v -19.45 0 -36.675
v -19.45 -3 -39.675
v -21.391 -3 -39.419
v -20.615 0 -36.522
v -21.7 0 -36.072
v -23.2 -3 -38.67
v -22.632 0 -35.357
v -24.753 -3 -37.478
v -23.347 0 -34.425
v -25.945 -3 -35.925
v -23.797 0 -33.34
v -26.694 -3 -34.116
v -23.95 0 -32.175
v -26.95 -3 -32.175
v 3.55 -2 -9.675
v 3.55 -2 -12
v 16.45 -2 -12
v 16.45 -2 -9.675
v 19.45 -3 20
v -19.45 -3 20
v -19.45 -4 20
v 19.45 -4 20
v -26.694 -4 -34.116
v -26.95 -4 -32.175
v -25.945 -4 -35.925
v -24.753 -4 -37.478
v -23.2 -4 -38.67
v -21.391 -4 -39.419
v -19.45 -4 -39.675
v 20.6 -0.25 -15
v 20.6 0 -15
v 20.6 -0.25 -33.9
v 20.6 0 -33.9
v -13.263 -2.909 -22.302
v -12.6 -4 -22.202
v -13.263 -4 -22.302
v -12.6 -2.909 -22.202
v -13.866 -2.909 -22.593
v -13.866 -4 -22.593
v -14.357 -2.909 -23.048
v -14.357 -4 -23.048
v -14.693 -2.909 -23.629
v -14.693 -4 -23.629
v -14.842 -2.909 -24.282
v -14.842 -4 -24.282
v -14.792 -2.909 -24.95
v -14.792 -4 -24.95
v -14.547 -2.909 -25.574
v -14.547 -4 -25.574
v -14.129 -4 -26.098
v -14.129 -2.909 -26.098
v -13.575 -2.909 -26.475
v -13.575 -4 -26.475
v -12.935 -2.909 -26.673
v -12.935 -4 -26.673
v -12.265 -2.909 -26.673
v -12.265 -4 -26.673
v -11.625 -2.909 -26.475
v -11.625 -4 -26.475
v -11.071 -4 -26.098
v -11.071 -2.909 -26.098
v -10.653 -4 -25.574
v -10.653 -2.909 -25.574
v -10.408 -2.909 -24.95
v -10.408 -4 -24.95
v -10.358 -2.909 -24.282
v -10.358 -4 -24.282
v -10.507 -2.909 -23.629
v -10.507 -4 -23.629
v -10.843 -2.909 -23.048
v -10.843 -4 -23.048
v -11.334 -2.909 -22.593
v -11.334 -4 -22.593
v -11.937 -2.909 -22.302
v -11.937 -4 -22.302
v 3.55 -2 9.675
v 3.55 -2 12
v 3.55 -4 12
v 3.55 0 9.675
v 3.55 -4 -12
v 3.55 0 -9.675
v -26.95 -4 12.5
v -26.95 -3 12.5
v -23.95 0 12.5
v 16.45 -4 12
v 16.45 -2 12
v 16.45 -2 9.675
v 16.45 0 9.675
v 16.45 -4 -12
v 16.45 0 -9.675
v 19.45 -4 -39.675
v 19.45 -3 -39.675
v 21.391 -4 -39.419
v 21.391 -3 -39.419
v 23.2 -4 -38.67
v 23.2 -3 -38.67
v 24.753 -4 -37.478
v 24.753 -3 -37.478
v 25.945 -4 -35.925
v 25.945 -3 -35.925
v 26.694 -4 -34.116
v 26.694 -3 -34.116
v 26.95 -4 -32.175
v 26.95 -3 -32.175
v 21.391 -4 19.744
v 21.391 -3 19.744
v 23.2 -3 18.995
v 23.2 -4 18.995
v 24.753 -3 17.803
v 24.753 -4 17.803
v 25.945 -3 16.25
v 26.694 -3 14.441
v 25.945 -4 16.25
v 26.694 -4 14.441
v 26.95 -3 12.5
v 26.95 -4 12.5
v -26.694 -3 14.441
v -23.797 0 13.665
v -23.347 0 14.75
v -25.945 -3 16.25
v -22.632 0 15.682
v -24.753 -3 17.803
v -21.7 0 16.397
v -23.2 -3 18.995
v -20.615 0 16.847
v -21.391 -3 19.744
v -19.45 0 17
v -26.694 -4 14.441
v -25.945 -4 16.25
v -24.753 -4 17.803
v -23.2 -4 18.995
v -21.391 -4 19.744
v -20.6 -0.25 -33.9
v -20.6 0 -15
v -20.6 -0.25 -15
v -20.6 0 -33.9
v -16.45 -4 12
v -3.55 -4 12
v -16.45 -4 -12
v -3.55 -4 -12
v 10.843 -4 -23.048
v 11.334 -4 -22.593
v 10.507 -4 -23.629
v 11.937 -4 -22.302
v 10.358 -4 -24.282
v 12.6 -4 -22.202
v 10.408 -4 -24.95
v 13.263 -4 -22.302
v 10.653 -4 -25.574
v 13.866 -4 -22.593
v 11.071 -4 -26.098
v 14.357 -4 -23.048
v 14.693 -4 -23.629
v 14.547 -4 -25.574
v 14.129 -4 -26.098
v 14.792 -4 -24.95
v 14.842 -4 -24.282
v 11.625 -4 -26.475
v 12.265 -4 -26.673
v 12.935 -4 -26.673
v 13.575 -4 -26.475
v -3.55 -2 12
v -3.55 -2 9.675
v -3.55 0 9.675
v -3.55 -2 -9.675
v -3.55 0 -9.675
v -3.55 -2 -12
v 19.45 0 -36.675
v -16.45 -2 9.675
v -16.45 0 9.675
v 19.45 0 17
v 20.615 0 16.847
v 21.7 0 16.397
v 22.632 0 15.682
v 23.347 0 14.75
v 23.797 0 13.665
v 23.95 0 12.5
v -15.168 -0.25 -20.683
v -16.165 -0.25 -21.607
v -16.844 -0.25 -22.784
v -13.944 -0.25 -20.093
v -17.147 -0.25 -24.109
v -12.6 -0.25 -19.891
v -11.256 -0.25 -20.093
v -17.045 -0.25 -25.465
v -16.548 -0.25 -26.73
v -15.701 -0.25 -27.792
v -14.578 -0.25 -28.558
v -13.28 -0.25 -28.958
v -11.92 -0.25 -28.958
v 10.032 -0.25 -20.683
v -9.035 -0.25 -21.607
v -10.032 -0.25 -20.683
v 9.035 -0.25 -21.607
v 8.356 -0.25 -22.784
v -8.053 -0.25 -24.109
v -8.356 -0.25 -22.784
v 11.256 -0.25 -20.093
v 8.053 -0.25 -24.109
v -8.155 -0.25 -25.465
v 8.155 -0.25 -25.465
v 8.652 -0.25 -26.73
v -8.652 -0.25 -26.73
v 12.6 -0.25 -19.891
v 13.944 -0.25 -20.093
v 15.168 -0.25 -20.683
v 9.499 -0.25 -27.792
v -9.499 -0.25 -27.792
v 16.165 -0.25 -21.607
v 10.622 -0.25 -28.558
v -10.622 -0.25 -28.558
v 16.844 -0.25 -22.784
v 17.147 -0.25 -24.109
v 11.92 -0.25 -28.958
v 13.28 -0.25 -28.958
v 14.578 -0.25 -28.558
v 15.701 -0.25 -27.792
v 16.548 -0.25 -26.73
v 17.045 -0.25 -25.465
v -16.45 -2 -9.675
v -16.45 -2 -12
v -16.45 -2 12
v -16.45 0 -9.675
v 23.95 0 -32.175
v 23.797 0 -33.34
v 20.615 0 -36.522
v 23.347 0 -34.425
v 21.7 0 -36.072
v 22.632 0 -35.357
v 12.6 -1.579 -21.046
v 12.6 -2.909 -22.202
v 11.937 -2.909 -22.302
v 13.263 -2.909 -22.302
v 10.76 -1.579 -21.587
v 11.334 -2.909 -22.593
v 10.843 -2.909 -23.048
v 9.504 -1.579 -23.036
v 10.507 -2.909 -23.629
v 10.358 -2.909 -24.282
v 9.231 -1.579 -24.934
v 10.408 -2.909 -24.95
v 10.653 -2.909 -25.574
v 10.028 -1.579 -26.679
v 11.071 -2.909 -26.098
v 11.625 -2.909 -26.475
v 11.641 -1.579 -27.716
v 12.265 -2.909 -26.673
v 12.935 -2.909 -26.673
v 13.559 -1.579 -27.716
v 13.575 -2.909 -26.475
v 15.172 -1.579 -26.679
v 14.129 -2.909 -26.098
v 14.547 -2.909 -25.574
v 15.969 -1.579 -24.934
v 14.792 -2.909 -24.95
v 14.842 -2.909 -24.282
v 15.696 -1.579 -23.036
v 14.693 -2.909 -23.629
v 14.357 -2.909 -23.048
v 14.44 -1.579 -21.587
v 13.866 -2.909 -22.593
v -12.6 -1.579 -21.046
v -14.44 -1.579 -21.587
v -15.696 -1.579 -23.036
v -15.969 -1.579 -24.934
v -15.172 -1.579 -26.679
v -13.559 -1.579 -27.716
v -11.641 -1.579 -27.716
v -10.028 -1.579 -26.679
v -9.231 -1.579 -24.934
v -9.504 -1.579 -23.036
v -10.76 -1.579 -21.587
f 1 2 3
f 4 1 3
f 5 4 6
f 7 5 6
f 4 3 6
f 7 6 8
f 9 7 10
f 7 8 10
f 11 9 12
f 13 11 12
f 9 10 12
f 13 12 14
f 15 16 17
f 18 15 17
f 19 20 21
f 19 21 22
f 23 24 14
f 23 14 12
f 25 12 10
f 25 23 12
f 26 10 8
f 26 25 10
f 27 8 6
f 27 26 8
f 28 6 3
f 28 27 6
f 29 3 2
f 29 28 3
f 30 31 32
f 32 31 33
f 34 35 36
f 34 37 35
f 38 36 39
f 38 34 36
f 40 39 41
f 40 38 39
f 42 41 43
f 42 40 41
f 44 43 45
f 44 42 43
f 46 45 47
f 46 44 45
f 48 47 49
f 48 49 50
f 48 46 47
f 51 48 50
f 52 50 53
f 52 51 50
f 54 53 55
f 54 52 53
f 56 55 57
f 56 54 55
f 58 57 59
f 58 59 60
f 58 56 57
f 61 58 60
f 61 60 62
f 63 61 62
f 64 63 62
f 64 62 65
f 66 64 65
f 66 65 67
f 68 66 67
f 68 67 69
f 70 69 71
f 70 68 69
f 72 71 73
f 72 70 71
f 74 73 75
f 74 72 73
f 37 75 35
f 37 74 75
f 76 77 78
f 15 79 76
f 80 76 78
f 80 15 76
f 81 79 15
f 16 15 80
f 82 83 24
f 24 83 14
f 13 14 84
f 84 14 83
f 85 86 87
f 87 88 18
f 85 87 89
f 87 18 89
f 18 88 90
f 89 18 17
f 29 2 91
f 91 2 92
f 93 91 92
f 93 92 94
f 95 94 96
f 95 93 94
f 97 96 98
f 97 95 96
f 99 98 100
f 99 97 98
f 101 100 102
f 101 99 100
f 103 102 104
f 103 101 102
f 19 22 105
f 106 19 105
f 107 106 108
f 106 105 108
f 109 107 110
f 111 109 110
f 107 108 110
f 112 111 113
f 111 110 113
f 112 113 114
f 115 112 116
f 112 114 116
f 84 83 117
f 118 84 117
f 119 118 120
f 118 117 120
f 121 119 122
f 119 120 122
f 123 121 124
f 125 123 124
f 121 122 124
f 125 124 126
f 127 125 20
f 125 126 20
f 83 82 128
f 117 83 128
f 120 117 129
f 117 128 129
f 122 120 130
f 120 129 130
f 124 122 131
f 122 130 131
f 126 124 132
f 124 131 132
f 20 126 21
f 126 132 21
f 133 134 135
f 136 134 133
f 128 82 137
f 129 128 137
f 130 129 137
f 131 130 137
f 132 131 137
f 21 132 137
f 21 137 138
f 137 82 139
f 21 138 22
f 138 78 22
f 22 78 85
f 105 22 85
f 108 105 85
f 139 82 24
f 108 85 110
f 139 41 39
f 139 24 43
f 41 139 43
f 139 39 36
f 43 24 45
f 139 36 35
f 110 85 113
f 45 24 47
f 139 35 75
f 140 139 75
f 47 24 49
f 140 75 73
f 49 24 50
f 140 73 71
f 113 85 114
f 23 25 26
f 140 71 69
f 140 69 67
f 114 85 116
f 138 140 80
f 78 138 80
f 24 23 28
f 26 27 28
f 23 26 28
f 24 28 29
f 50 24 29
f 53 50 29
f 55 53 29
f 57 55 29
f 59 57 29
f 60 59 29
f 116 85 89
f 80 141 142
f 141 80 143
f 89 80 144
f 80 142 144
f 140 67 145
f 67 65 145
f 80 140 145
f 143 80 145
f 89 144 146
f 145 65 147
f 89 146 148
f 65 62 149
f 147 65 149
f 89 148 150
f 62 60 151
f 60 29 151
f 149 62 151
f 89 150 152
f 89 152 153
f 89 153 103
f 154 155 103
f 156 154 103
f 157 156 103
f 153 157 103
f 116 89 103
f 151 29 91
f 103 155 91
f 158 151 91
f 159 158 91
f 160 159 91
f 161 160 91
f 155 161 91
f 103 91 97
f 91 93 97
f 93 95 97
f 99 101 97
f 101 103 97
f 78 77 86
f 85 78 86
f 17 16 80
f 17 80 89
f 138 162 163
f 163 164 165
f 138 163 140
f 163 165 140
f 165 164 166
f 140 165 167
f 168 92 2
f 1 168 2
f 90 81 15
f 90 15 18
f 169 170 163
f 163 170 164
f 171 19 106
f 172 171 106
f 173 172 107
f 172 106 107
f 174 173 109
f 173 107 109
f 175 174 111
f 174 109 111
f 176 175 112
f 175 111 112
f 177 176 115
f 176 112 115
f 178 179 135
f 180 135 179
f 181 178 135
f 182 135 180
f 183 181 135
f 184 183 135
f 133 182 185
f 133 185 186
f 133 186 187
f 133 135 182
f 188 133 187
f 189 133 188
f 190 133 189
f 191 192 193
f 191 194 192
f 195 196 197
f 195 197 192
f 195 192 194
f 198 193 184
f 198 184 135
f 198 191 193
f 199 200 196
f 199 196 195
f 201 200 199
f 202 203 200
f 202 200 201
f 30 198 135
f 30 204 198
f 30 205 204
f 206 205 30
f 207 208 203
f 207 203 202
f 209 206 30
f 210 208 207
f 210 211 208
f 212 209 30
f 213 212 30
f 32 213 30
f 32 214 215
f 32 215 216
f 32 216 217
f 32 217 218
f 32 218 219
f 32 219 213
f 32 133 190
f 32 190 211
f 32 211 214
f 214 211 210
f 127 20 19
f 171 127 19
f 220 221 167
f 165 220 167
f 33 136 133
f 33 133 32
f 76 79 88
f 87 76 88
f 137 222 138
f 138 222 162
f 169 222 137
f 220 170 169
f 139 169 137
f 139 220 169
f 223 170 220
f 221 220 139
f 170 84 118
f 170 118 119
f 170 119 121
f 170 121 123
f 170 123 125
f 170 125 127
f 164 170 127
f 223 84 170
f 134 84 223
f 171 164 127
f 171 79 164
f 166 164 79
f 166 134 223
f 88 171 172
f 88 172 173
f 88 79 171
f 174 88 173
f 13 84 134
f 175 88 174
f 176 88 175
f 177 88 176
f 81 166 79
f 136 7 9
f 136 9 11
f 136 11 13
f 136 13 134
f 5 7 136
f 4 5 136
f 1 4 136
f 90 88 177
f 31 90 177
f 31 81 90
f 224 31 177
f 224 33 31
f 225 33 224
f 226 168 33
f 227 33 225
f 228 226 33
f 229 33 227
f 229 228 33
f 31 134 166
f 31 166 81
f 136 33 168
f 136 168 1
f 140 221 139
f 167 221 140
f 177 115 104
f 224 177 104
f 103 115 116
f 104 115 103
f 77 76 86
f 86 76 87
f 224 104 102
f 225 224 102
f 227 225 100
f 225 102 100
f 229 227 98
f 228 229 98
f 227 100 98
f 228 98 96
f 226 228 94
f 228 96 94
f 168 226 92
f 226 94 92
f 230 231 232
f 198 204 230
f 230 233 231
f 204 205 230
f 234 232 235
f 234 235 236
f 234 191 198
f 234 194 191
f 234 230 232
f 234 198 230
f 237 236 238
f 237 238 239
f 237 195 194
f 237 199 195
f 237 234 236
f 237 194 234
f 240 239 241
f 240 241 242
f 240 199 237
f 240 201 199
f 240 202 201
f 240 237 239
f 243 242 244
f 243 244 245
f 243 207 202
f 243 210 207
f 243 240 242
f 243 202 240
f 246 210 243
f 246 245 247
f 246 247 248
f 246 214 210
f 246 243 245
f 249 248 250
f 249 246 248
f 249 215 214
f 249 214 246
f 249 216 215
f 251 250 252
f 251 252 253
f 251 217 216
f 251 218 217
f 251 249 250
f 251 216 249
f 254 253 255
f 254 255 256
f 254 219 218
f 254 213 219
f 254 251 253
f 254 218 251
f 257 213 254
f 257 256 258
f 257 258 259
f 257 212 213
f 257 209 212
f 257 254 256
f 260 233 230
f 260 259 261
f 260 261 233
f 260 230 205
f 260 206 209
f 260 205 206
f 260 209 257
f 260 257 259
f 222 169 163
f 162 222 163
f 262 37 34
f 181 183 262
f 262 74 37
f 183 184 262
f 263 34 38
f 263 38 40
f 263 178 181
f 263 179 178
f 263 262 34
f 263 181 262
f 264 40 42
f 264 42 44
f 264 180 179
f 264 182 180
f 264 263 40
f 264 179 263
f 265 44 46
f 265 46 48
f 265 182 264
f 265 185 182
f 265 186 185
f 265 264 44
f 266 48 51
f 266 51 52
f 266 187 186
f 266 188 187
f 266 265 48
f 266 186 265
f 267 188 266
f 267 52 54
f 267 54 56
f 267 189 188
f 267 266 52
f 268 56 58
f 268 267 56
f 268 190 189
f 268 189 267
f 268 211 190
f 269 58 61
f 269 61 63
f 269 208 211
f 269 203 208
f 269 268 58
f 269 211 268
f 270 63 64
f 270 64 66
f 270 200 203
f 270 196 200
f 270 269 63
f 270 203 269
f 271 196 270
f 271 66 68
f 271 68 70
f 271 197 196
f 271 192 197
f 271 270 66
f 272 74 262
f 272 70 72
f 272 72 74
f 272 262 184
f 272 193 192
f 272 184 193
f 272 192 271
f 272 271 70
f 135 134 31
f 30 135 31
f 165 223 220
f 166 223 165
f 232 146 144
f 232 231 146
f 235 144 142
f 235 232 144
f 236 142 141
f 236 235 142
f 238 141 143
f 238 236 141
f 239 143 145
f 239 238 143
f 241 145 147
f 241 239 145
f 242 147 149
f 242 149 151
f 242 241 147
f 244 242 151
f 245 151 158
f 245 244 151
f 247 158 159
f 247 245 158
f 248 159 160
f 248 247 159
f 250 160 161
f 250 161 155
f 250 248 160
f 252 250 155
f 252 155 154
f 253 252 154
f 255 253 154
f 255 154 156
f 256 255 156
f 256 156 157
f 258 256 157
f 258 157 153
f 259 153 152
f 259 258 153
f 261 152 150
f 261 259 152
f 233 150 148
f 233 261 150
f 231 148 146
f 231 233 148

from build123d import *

# Parameters (mm, degrees)
SKETCH1_W                                     = 53.9
SKETCH1_H                                     = 59.675
SKETCH1_W_2                                   = 12.9
SKETCH1_H_2                                   = 19.35
BOSS_EXTRUDE1_DEPTH                           = 4
FILLET1_R                                     = 7.5
CHAMFER1_SIZE                                 = 3
CUT_EXTRUDE1_START                            = -2
SKETCH4_W                                     = 12.9
SKETCH4_H                                     = 24
CUT_EXTRUDE1_DEPTH                            = 3
SKETCH5_W                                     = 41.2
SKETCH5_H                                     = 18.9
CUT_EXTRUDE2_DEPTH                            = 0.25
CSK_FOR_8_FLAT_HEAD_SOCKET_CAP_SCREW1_A_COUNT = 2
CSK_FOR_8_FLAT_HEAD_SOCKET_CAP_SCREW1_A_PITCH = 25.2


with BuildPart() as part:
    # Sketch1 → Boss-Extrude1 (new body)
    with BuildSketch(Plane(origin=(0, 0, 0), x_dir=(1, 0, 0), z_dir=(0, 1, 0))):
        with Locations((0, 9.8375)):
            Rectangle(SKETCH1_W, SKETCH1_H)
        with Locations((10, 0)):
            Rectangle(SKETCH1_W_2, SKETCH1_H_2, mode=Mode.SUBTRACT)
        with Locations((-10, 0)):
            Rectangle(SKETCH1_W_2, SKETCH1_H_2, mode=Mode.SUBTRACT)
    extrude(amount=-BOSS_EXTRUDE1_DEPTH)

    # Fillet1
    fillet1_edges = [part.edges().sort_by_distance(p)[0] for p in [
        (26.95, -2, 20),
        (-26.95, -2, 20),
        (-26.95, -2, -39.675),
        (26.95, -2, -39.675),
    ]]
    fillet(fillet1_edges, radius=FILLET1_R)

    # Chamfer1
    chamfer1_edges = [part.edges().sort_by_distance(p)[0] for p in [
        (26.95, 0, -9.8375),
        (0, 0, -39.675),
        (-26.95, 0, -9.8375),
        (0, 0, 20),
        (-24.753300859, 0, 17.803300859),
        (24.753300859, 0, 17.803300859),
        (-24.753300859, 0, -37.478300859),
        (24.753300859, 0, -37.478300859),
    ]]
    chamfer(chamfer1_edges, length=CHAMFER1_SIZE)

    # Sketch4 → Cut-Extrude1 (cut, through all)
    with BuildSketch(Plane(origin=(0, 0, 0), x_dir=(1, 0, 0), z_dir=(0, 1, 0)).offset(CUT_EXTRUDE1_START)):
        with Locations((-10, 0)):
            Rectangle(SKETCH4_W, SKETCH4_H)
        with Locations((10, 0)):
            Rectangle(SKETCH4_W, SKETCH4_H)
    extrude(amount=-CUT_EXTRUDE1_DEPTH, mode=Mode.SUBTRACT)

    # Sketch5 → Cut-Extrude2 (cut)
    with BuildSketch(Plane(origin=(0, 0, 0), x_dir=(1, 0, 0), z_dir=(0, 1, 0))):
        with Locations((0, 24.45)):
            Rectangle(SKETCH5_W, SKETCH5_H)
    extrude(amount=-CUT_EXTRUDE2_DEPTH, mode=Mode.SUBTRACT)

    # Sketch3 → CSK for #8 Flat Head Socket Cap Screw1 (revolve, cut)
    with BuildSketch(Plane(origin=(-12.6, -0.25, -24.45), x_dir=(0, 0, 1), z_dir=(1, 0, 0))):
        Polygon((0, 0), (0, 3.75), (2.2479, 3.75), (2.2479, 2.658961536), (4.5593, 0), align=None)
    csk_for_8_flat_head_socket_cap_screw1 = revolve(axis=Axis((-12.6, 6.1, -24.45), (0, -1, 0)), mode=Mode.SUBTRACT)

    # CSK for #8 Flat Head Socket Cap Screw1 a: CSK for #8 Flat Head Socket Cap Screw1 ×2
    with Locations(*[(i * CSK_FOR_8_FLAT_HEAD_SOCKET_CAP_SCREW1_A_PITCH, 0, 0) for i in range(1, CSK_FOR_8_FLAT_HEAD_SOCKET_CAP_SCREW1_A_COUNT)]):
        add(csk_for_8_flat_head_socket_cap_screw1, mode=Mode.SUBTRACT)


solid = part.part
